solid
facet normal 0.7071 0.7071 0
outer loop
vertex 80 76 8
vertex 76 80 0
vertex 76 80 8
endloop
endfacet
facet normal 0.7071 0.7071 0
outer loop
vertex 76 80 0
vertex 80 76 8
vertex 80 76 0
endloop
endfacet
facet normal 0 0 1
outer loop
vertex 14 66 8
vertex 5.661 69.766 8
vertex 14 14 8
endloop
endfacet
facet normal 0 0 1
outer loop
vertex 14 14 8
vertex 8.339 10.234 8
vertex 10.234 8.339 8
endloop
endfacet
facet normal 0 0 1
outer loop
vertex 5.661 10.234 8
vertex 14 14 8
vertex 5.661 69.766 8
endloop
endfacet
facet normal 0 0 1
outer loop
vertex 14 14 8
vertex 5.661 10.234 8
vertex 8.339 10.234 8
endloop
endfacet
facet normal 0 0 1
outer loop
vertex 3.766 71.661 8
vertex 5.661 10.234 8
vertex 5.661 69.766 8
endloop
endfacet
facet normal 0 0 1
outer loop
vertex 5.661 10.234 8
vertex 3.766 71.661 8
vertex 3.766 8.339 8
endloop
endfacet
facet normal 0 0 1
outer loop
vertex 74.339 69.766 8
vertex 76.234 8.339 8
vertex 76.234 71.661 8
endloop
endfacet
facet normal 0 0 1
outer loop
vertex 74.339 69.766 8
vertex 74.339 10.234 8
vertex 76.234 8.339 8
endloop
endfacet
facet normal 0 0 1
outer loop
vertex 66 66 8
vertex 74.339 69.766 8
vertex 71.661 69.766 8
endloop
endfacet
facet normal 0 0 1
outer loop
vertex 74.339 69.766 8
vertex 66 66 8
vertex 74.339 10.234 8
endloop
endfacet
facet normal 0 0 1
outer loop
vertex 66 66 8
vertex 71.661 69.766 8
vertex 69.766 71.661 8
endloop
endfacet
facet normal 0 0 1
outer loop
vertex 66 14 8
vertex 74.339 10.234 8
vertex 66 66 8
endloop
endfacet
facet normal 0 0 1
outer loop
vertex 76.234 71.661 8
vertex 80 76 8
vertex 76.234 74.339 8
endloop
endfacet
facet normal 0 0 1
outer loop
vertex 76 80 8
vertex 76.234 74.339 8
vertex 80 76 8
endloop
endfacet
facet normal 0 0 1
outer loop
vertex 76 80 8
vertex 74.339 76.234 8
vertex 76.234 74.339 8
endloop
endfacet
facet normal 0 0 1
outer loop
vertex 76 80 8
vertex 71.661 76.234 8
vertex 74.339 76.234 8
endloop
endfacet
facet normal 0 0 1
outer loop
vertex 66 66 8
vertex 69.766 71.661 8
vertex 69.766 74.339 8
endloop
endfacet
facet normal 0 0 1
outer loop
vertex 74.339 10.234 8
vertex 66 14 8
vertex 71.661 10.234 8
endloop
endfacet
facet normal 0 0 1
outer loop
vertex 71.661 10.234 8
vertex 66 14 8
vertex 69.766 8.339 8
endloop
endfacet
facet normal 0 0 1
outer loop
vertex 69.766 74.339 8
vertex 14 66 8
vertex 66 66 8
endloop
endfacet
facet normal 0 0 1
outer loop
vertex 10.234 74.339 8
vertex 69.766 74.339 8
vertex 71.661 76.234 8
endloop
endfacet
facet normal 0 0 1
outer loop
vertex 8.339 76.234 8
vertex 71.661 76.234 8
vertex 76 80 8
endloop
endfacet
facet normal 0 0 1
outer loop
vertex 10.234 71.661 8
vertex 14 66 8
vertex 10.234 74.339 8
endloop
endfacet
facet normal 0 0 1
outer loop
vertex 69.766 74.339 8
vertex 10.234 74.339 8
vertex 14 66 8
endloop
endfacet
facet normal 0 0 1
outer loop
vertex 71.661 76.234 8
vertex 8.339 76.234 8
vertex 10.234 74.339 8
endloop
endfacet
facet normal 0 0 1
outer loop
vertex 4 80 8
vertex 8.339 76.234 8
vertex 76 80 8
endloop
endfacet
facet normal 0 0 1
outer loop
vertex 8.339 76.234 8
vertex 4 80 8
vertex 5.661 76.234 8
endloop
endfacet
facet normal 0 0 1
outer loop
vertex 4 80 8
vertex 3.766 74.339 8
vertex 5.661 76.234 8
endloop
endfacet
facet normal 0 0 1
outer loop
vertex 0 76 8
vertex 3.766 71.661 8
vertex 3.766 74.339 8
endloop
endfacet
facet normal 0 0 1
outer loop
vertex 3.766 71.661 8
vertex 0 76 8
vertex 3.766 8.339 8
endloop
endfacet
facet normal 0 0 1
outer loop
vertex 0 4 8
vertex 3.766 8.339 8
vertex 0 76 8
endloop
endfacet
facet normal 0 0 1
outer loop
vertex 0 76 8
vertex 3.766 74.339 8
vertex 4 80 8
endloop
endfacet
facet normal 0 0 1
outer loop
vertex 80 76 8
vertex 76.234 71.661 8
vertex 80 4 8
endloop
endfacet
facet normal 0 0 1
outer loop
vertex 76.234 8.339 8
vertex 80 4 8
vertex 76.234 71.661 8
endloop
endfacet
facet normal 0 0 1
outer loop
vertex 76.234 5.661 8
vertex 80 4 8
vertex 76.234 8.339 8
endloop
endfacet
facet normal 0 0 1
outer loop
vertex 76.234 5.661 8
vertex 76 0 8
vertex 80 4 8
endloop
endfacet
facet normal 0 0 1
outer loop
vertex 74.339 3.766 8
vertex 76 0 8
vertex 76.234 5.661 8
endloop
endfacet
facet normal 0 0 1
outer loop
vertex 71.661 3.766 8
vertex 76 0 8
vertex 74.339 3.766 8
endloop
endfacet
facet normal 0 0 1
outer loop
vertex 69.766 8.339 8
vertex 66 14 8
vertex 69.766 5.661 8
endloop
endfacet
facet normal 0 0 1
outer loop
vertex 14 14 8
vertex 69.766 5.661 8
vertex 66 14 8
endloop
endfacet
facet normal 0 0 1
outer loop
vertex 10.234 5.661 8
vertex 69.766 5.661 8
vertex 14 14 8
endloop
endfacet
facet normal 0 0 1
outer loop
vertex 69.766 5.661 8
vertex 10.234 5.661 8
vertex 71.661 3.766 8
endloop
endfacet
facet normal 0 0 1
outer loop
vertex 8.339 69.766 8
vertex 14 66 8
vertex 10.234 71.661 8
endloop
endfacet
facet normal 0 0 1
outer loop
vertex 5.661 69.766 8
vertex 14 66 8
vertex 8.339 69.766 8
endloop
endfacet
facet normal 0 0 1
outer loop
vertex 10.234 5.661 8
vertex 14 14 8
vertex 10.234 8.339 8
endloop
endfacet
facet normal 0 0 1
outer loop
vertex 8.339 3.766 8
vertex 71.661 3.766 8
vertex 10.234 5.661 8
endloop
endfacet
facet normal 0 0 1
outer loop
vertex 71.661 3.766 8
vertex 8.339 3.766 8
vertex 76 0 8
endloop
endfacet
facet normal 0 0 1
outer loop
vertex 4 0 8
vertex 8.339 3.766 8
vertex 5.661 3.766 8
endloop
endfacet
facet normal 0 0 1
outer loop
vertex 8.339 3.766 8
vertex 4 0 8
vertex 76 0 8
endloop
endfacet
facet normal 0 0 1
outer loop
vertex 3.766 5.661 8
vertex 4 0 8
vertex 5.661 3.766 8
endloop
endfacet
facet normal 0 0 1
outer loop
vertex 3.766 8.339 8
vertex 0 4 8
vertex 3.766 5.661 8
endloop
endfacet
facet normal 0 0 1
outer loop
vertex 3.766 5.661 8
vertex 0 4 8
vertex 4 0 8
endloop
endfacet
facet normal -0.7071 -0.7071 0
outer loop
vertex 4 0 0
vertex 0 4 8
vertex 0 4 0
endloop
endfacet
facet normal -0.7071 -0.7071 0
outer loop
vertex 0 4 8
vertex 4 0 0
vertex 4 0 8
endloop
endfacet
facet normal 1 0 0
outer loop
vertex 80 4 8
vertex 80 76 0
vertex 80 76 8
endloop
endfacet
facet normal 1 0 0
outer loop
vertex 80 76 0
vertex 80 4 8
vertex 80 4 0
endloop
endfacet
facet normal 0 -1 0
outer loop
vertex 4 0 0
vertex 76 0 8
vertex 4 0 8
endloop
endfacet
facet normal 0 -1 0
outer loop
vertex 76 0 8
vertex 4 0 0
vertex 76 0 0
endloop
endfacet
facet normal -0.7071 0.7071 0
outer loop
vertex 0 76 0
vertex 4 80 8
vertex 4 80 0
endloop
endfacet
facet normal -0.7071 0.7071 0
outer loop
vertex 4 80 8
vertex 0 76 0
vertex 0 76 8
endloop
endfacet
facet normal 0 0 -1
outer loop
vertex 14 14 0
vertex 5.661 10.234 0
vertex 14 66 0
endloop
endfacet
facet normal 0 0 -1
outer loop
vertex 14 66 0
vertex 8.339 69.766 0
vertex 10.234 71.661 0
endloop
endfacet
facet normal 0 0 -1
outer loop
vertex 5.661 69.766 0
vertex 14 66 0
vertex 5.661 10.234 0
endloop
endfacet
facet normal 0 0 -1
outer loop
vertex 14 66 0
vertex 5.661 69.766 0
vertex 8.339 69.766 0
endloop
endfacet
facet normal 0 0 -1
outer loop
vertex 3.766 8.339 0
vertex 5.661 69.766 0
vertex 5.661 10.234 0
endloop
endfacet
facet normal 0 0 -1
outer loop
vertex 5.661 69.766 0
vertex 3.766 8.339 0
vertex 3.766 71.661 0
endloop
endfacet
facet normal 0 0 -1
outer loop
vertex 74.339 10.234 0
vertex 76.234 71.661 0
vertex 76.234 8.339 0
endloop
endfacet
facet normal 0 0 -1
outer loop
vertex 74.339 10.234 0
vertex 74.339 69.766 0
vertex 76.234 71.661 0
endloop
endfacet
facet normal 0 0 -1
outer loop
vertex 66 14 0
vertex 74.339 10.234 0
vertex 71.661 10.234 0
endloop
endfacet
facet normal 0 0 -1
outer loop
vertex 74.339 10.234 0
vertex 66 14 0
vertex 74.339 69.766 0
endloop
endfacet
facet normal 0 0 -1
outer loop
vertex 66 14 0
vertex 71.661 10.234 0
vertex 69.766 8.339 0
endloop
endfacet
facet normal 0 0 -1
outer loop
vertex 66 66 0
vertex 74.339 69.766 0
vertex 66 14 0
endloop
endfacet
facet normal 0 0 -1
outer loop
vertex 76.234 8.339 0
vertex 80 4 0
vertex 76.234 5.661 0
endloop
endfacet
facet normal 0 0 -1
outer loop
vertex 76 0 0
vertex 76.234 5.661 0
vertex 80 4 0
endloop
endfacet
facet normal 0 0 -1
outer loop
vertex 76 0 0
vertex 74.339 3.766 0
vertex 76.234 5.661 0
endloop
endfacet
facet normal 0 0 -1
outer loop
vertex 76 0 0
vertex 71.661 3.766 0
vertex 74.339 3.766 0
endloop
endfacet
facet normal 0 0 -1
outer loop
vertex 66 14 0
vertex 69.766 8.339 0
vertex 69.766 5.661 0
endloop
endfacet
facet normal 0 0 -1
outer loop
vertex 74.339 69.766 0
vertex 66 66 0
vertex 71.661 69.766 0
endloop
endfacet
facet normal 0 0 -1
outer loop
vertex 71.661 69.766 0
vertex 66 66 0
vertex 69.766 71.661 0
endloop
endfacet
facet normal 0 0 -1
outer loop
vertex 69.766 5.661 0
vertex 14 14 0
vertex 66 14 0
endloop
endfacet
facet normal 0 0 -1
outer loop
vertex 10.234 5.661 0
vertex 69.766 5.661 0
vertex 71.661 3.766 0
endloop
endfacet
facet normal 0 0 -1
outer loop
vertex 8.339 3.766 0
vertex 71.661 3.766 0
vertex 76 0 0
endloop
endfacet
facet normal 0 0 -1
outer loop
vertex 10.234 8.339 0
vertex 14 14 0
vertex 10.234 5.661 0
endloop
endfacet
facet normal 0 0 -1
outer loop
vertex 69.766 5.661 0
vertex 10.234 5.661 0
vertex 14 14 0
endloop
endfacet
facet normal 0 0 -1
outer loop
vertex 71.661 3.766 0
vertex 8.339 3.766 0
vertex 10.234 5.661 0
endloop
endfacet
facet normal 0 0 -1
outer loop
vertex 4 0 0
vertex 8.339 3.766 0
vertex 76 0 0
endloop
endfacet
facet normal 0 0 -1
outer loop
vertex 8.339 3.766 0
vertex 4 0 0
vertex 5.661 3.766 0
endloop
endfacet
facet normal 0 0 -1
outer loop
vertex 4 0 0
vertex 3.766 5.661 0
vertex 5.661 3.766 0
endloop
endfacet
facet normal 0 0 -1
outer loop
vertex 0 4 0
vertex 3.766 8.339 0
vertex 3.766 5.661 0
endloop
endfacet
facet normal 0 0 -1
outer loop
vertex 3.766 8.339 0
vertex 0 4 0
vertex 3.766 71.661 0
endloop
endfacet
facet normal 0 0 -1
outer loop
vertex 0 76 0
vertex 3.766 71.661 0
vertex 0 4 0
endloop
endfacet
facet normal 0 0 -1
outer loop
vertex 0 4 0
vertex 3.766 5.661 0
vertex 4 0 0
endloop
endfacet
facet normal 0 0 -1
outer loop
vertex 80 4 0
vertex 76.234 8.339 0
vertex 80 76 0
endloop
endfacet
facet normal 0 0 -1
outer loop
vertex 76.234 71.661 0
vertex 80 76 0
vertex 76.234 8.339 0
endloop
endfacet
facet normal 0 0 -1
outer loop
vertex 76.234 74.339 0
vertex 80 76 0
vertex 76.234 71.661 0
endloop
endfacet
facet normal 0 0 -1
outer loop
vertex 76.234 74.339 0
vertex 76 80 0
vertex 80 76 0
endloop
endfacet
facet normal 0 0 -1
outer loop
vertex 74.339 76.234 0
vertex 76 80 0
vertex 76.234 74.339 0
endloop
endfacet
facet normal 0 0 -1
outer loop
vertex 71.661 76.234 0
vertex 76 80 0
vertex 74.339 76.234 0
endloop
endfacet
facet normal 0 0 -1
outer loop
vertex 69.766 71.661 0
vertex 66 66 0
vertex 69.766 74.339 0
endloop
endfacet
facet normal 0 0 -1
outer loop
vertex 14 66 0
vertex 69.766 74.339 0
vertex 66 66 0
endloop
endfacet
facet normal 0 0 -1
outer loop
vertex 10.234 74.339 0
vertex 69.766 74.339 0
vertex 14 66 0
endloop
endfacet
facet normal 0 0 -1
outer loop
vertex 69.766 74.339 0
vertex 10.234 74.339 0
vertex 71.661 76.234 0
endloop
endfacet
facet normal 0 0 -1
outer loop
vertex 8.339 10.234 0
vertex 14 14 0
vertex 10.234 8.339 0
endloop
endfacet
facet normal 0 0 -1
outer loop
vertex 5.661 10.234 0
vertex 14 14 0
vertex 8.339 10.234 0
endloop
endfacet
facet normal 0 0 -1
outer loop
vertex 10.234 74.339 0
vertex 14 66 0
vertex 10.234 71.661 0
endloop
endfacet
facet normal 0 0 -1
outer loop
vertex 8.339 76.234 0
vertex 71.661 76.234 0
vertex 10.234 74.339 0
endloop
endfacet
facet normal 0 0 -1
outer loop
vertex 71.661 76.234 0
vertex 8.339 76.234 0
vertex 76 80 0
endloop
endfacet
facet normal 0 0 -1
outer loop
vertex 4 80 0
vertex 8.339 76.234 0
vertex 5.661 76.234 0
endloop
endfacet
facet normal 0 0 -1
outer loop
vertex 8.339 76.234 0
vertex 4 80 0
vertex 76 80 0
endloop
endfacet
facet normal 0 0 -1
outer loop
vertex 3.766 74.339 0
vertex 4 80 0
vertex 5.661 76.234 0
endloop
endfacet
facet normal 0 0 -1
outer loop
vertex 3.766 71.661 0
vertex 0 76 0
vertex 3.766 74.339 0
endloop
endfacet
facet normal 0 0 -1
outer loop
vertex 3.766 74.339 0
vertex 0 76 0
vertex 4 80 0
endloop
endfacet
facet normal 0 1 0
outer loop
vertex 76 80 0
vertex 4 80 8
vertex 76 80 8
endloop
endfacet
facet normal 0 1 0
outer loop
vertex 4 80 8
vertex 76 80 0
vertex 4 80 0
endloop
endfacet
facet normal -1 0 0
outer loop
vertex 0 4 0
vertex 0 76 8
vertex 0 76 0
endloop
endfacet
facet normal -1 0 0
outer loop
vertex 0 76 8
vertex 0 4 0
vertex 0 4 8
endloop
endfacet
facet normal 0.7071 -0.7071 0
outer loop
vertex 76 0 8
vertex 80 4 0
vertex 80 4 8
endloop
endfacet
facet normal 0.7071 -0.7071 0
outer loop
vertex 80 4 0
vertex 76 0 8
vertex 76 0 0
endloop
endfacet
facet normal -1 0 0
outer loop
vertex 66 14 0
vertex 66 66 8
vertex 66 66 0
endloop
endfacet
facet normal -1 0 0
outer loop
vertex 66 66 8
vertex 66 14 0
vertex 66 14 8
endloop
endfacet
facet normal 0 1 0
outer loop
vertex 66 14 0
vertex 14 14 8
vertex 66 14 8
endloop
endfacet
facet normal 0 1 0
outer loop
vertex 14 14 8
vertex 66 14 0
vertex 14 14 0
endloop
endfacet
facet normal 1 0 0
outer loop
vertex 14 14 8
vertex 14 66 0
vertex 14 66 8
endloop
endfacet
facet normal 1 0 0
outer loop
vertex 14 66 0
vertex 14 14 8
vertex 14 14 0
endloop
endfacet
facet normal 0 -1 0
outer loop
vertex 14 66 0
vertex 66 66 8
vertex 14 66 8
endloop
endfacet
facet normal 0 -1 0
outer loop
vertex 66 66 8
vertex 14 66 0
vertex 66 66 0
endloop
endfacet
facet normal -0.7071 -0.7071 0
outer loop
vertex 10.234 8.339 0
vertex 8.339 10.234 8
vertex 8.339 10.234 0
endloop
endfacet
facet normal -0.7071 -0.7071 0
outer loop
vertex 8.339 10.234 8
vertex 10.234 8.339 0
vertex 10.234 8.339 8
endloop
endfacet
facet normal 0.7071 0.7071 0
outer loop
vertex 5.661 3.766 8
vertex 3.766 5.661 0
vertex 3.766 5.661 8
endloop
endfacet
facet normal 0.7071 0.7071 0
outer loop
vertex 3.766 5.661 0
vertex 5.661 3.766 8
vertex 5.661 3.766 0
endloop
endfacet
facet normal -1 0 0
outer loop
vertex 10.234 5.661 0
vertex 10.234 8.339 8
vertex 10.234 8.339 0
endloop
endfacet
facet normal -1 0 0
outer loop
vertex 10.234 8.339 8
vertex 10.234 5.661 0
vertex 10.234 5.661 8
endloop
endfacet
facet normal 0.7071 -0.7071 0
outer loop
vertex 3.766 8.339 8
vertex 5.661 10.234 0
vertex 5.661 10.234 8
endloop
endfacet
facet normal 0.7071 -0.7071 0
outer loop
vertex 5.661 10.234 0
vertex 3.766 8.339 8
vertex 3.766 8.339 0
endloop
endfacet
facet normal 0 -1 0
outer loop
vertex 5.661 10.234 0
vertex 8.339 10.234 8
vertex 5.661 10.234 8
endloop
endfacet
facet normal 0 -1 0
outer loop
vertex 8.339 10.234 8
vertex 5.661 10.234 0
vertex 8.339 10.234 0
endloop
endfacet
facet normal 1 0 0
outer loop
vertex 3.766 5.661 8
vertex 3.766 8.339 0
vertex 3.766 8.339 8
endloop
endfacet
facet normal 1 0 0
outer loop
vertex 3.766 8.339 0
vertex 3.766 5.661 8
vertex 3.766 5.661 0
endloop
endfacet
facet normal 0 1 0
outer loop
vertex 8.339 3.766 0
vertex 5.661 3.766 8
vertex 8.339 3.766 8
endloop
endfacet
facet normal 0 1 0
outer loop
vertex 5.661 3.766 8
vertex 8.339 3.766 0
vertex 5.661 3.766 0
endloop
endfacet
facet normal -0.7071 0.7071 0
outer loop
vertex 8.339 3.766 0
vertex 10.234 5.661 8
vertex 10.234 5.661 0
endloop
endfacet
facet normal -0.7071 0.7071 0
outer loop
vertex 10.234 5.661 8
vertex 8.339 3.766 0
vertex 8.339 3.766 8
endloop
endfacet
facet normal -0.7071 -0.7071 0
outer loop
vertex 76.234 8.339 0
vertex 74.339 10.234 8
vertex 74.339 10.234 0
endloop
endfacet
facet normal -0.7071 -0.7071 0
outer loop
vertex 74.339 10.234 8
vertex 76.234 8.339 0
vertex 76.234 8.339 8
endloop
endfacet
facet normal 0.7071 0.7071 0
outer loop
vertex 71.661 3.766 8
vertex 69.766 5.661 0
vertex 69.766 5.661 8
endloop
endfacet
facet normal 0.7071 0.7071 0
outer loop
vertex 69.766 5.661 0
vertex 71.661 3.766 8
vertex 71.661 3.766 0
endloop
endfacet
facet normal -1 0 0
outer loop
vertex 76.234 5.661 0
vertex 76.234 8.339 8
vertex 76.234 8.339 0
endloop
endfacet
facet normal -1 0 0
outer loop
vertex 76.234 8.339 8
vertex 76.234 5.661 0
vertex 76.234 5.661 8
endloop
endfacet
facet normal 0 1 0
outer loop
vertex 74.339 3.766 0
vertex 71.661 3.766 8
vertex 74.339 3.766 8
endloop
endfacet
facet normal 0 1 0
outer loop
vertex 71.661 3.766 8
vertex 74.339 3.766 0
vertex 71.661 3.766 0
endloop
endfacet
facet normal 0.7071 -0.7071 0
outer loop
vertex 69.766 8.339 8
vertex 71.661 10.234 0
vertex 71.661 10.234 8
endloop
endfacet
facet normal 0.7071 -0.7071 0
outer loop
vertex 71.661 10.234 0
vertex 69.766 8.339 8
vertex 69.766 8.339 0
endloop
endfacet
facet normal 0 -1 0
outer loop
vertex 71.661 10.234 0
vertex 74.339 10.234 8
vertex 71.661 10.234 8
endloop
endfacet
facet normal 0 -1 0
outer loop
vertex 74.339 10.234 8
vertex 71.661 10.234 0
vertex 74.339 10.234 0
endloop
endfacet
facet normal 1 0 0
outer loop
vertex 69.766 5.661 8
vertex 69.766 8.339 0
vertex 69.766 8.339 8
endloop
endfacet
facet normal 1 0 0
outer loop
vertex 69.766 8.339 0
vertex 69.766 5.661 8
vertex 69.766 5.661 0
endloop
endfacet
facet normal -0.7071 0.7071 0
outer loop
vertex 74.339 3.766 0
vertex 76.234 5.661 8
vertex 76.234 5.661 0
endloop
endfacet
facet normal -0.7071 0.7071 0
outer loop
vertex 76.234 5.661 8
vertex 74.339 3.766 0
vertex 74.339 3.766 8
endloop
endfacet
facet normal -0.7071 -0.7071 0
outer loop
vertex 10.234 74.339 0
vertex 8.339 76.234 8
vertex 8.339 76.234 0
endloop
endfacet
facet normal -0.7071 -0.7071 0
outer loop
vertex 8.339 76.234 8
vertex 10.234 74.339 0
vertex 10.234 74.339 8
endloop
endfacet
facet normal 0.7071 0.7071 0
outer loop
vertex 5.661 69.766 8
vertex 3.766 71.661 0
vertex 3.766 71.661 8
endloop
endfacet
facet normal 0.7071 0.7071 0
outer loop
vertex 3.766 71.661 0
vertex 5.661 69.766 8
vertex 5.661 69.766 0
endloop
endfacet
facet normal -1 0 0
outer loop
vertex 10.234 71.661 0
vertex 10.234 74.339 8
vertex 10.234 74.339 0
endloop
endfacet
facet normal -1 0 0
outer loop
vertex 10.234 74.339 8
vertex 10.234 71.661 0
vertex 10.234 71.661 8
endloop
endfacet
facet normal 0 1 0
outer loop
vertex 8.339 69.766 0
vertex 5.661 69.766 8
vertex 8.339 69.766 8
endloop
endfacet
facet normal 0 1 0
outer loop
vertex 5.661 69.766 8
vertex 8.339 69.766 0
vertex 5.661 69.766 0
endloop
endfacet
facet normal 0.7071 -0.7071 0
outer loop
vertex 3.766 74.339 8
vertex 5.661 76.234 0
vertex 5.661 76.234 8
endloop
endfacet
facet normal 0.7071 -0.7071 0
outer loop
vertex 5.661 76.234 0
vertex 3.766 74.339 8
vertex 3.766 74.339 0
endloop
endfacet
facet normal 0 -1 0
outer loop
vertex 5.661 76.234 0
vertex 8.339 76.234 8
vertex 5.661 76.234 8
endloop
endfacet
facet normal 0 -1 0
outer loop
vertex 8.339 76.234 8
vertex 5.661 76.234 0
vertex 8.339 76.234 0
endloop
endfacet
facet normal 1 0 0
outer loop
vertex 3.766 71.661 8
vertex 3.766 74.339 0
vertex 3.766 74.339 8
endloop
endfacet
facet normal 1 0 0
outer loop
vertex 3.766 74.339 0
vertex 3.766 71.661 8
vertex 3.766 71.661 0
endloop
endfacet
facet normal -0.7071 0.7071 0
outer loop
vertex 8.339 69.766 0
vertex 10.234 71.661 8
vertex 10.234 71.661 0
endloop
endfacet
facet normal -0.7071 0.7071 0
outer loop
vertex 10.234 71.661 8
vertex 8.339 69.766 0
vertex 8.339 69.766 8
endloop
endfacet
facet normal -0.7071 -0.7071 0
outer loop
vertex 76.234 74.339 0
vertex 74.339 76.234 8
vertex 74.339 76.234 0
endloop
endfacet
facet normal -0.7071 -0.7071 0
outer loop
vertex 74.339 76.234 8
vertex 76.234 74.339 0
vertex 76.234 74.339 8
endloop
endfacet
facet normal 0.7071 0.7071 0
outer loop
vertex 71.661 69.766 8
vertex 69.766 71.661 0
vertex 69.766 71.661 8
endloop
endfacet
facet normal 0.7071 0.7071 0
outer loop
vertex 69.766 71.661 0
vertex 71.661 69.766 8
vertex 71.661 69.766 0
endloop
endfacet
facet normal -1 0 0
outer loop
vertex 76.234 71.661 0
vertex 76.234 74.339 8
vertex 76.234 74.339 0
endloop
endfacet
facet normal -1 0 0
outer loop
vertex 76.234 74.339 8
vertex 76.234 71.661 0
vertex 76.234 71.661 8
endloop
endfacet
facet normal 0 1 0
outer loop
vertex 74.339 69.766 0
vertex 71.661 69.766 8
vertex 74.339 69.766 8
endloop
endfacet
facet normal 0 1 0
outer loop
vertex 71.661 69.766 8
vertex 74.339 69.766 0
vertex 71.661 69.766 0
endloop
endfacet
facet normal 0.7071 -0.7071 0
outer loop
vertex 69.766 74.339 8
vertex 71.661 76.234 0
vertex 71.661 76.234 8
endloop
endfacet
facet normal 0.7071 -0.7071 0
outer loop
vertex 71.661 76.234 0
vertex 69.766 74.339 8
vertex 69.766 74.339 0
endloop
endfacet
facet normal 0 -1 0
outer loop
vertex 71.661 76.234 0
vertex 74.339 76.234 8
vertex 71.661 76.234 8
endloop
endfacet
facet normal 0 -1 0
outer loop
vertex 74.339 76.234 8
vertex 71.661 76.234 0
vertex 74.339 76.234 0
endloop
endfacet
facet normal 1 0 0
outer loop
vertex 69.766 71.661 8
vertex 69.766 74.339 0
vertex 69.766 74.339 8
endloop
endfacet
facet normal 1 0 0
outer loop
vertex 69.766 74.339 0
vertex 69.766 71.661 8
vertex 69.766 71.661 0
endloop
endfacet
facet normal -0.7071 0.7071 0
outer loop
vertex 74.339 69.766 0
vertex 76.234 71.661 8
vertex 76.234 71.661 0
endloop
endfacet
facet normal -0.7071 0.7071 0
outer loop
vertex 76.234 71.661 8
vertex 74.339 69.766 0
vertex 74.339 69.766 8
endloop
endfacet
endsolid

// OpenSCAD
$fn = 32;

// ----------------------------------------------------------------------
// Frame plate: 80 x 80 frame, 14 mm rails
// ----------------------------------------------------------------------

// --- parameters (mm) ---
plate_l = 80;             // plate length, X
plate_w = 80;             // plate width, Y
plate_t = 8;              // plate thickness, Z (extrusion height)
corner_c = 4;             // corner chamfer
frame_bar = 14;           // frame rail width
bolt_r = 3.5;             // corner bolt window radius
bolt_inset = 7;           // bolt centre inset from the edges
fit_tol = 0.1;            // declared fit tolerance (prompt contract)
free_tol = 0.3;           // declared free tolerance (prompt contract)

win_l = plate_l - 2 * frame_bar;  // window length
win_w = plate_w - 2 * frame_bar;  // window width
bolt_d = 2 * bolt_r;  // corner hole diameter

profile = [[4, 0], [76, 0], [80, 4], [80, 76], [76, 80], [4, 80], [0, 76], [0, 4]];  // primary outline, 8 points, counter clockwise
void_1 = [[14, 14], [66, 14], [66, 66], [14, 66]];  // the window, 4 points
void_2 = [[10.234, 8.339], [8.339, 10.234], [5.661, 10.234], [3.766, 8.339], [3.766, 5.661], [5.661, 3.766], [8.339, 3.766], [10.234, 5.661]];  // corner bolt window, 8 points
void_3 = [[76.234, 8.339], [74.339, 10.234], [71.661, 10.234], [69.766, 8.339], [69.766, 5.661], [71.661, 3.766], [74.339, 3.766], [76.234, 5.661]];  // corner bolt window, 8 points
void_4 = [[10.234, 74.339], [8.339, 76.234], [5.661, 76.234], [3.766, 74.339], [3.766, 71.661], [5.661, 69.766], [8.339, 69.766], [10.234, 71.661]];  // corner bolt window, 8 points
void_5 = [[76.234, 74.339], [74.339, 76.234], [71.661, 76.234], [69.766, 74.339], [69.766, 71.661], [71.661, 69.766], [74.339, 69.766], [76.234, 71.661]];  // corner bolt window, 8 points

// --- the one profile operation ---
difference() {
  linear_extrude(height = plate_t) polygon(points = profile);
  translate([0, 0, -1])
    linear_extrude(height = plate_t + 2) polygon(points = void_1);
  translate([0, 0, -1])
    linear_extrude(height = plate_t + 2) polygon(points = void_2);
  translate([0, 0, -1])
    linear_extrude(height = plate_t + 2) polygon(points = void_3);
  translate([0, 0, -1])
    linear_extrude(height = plate_t + 2) polygon(points = void_4);
  translate([0, 0, -1])
    linear_extrude(height = plate_t + 2) polygon(points = void_5);
}
